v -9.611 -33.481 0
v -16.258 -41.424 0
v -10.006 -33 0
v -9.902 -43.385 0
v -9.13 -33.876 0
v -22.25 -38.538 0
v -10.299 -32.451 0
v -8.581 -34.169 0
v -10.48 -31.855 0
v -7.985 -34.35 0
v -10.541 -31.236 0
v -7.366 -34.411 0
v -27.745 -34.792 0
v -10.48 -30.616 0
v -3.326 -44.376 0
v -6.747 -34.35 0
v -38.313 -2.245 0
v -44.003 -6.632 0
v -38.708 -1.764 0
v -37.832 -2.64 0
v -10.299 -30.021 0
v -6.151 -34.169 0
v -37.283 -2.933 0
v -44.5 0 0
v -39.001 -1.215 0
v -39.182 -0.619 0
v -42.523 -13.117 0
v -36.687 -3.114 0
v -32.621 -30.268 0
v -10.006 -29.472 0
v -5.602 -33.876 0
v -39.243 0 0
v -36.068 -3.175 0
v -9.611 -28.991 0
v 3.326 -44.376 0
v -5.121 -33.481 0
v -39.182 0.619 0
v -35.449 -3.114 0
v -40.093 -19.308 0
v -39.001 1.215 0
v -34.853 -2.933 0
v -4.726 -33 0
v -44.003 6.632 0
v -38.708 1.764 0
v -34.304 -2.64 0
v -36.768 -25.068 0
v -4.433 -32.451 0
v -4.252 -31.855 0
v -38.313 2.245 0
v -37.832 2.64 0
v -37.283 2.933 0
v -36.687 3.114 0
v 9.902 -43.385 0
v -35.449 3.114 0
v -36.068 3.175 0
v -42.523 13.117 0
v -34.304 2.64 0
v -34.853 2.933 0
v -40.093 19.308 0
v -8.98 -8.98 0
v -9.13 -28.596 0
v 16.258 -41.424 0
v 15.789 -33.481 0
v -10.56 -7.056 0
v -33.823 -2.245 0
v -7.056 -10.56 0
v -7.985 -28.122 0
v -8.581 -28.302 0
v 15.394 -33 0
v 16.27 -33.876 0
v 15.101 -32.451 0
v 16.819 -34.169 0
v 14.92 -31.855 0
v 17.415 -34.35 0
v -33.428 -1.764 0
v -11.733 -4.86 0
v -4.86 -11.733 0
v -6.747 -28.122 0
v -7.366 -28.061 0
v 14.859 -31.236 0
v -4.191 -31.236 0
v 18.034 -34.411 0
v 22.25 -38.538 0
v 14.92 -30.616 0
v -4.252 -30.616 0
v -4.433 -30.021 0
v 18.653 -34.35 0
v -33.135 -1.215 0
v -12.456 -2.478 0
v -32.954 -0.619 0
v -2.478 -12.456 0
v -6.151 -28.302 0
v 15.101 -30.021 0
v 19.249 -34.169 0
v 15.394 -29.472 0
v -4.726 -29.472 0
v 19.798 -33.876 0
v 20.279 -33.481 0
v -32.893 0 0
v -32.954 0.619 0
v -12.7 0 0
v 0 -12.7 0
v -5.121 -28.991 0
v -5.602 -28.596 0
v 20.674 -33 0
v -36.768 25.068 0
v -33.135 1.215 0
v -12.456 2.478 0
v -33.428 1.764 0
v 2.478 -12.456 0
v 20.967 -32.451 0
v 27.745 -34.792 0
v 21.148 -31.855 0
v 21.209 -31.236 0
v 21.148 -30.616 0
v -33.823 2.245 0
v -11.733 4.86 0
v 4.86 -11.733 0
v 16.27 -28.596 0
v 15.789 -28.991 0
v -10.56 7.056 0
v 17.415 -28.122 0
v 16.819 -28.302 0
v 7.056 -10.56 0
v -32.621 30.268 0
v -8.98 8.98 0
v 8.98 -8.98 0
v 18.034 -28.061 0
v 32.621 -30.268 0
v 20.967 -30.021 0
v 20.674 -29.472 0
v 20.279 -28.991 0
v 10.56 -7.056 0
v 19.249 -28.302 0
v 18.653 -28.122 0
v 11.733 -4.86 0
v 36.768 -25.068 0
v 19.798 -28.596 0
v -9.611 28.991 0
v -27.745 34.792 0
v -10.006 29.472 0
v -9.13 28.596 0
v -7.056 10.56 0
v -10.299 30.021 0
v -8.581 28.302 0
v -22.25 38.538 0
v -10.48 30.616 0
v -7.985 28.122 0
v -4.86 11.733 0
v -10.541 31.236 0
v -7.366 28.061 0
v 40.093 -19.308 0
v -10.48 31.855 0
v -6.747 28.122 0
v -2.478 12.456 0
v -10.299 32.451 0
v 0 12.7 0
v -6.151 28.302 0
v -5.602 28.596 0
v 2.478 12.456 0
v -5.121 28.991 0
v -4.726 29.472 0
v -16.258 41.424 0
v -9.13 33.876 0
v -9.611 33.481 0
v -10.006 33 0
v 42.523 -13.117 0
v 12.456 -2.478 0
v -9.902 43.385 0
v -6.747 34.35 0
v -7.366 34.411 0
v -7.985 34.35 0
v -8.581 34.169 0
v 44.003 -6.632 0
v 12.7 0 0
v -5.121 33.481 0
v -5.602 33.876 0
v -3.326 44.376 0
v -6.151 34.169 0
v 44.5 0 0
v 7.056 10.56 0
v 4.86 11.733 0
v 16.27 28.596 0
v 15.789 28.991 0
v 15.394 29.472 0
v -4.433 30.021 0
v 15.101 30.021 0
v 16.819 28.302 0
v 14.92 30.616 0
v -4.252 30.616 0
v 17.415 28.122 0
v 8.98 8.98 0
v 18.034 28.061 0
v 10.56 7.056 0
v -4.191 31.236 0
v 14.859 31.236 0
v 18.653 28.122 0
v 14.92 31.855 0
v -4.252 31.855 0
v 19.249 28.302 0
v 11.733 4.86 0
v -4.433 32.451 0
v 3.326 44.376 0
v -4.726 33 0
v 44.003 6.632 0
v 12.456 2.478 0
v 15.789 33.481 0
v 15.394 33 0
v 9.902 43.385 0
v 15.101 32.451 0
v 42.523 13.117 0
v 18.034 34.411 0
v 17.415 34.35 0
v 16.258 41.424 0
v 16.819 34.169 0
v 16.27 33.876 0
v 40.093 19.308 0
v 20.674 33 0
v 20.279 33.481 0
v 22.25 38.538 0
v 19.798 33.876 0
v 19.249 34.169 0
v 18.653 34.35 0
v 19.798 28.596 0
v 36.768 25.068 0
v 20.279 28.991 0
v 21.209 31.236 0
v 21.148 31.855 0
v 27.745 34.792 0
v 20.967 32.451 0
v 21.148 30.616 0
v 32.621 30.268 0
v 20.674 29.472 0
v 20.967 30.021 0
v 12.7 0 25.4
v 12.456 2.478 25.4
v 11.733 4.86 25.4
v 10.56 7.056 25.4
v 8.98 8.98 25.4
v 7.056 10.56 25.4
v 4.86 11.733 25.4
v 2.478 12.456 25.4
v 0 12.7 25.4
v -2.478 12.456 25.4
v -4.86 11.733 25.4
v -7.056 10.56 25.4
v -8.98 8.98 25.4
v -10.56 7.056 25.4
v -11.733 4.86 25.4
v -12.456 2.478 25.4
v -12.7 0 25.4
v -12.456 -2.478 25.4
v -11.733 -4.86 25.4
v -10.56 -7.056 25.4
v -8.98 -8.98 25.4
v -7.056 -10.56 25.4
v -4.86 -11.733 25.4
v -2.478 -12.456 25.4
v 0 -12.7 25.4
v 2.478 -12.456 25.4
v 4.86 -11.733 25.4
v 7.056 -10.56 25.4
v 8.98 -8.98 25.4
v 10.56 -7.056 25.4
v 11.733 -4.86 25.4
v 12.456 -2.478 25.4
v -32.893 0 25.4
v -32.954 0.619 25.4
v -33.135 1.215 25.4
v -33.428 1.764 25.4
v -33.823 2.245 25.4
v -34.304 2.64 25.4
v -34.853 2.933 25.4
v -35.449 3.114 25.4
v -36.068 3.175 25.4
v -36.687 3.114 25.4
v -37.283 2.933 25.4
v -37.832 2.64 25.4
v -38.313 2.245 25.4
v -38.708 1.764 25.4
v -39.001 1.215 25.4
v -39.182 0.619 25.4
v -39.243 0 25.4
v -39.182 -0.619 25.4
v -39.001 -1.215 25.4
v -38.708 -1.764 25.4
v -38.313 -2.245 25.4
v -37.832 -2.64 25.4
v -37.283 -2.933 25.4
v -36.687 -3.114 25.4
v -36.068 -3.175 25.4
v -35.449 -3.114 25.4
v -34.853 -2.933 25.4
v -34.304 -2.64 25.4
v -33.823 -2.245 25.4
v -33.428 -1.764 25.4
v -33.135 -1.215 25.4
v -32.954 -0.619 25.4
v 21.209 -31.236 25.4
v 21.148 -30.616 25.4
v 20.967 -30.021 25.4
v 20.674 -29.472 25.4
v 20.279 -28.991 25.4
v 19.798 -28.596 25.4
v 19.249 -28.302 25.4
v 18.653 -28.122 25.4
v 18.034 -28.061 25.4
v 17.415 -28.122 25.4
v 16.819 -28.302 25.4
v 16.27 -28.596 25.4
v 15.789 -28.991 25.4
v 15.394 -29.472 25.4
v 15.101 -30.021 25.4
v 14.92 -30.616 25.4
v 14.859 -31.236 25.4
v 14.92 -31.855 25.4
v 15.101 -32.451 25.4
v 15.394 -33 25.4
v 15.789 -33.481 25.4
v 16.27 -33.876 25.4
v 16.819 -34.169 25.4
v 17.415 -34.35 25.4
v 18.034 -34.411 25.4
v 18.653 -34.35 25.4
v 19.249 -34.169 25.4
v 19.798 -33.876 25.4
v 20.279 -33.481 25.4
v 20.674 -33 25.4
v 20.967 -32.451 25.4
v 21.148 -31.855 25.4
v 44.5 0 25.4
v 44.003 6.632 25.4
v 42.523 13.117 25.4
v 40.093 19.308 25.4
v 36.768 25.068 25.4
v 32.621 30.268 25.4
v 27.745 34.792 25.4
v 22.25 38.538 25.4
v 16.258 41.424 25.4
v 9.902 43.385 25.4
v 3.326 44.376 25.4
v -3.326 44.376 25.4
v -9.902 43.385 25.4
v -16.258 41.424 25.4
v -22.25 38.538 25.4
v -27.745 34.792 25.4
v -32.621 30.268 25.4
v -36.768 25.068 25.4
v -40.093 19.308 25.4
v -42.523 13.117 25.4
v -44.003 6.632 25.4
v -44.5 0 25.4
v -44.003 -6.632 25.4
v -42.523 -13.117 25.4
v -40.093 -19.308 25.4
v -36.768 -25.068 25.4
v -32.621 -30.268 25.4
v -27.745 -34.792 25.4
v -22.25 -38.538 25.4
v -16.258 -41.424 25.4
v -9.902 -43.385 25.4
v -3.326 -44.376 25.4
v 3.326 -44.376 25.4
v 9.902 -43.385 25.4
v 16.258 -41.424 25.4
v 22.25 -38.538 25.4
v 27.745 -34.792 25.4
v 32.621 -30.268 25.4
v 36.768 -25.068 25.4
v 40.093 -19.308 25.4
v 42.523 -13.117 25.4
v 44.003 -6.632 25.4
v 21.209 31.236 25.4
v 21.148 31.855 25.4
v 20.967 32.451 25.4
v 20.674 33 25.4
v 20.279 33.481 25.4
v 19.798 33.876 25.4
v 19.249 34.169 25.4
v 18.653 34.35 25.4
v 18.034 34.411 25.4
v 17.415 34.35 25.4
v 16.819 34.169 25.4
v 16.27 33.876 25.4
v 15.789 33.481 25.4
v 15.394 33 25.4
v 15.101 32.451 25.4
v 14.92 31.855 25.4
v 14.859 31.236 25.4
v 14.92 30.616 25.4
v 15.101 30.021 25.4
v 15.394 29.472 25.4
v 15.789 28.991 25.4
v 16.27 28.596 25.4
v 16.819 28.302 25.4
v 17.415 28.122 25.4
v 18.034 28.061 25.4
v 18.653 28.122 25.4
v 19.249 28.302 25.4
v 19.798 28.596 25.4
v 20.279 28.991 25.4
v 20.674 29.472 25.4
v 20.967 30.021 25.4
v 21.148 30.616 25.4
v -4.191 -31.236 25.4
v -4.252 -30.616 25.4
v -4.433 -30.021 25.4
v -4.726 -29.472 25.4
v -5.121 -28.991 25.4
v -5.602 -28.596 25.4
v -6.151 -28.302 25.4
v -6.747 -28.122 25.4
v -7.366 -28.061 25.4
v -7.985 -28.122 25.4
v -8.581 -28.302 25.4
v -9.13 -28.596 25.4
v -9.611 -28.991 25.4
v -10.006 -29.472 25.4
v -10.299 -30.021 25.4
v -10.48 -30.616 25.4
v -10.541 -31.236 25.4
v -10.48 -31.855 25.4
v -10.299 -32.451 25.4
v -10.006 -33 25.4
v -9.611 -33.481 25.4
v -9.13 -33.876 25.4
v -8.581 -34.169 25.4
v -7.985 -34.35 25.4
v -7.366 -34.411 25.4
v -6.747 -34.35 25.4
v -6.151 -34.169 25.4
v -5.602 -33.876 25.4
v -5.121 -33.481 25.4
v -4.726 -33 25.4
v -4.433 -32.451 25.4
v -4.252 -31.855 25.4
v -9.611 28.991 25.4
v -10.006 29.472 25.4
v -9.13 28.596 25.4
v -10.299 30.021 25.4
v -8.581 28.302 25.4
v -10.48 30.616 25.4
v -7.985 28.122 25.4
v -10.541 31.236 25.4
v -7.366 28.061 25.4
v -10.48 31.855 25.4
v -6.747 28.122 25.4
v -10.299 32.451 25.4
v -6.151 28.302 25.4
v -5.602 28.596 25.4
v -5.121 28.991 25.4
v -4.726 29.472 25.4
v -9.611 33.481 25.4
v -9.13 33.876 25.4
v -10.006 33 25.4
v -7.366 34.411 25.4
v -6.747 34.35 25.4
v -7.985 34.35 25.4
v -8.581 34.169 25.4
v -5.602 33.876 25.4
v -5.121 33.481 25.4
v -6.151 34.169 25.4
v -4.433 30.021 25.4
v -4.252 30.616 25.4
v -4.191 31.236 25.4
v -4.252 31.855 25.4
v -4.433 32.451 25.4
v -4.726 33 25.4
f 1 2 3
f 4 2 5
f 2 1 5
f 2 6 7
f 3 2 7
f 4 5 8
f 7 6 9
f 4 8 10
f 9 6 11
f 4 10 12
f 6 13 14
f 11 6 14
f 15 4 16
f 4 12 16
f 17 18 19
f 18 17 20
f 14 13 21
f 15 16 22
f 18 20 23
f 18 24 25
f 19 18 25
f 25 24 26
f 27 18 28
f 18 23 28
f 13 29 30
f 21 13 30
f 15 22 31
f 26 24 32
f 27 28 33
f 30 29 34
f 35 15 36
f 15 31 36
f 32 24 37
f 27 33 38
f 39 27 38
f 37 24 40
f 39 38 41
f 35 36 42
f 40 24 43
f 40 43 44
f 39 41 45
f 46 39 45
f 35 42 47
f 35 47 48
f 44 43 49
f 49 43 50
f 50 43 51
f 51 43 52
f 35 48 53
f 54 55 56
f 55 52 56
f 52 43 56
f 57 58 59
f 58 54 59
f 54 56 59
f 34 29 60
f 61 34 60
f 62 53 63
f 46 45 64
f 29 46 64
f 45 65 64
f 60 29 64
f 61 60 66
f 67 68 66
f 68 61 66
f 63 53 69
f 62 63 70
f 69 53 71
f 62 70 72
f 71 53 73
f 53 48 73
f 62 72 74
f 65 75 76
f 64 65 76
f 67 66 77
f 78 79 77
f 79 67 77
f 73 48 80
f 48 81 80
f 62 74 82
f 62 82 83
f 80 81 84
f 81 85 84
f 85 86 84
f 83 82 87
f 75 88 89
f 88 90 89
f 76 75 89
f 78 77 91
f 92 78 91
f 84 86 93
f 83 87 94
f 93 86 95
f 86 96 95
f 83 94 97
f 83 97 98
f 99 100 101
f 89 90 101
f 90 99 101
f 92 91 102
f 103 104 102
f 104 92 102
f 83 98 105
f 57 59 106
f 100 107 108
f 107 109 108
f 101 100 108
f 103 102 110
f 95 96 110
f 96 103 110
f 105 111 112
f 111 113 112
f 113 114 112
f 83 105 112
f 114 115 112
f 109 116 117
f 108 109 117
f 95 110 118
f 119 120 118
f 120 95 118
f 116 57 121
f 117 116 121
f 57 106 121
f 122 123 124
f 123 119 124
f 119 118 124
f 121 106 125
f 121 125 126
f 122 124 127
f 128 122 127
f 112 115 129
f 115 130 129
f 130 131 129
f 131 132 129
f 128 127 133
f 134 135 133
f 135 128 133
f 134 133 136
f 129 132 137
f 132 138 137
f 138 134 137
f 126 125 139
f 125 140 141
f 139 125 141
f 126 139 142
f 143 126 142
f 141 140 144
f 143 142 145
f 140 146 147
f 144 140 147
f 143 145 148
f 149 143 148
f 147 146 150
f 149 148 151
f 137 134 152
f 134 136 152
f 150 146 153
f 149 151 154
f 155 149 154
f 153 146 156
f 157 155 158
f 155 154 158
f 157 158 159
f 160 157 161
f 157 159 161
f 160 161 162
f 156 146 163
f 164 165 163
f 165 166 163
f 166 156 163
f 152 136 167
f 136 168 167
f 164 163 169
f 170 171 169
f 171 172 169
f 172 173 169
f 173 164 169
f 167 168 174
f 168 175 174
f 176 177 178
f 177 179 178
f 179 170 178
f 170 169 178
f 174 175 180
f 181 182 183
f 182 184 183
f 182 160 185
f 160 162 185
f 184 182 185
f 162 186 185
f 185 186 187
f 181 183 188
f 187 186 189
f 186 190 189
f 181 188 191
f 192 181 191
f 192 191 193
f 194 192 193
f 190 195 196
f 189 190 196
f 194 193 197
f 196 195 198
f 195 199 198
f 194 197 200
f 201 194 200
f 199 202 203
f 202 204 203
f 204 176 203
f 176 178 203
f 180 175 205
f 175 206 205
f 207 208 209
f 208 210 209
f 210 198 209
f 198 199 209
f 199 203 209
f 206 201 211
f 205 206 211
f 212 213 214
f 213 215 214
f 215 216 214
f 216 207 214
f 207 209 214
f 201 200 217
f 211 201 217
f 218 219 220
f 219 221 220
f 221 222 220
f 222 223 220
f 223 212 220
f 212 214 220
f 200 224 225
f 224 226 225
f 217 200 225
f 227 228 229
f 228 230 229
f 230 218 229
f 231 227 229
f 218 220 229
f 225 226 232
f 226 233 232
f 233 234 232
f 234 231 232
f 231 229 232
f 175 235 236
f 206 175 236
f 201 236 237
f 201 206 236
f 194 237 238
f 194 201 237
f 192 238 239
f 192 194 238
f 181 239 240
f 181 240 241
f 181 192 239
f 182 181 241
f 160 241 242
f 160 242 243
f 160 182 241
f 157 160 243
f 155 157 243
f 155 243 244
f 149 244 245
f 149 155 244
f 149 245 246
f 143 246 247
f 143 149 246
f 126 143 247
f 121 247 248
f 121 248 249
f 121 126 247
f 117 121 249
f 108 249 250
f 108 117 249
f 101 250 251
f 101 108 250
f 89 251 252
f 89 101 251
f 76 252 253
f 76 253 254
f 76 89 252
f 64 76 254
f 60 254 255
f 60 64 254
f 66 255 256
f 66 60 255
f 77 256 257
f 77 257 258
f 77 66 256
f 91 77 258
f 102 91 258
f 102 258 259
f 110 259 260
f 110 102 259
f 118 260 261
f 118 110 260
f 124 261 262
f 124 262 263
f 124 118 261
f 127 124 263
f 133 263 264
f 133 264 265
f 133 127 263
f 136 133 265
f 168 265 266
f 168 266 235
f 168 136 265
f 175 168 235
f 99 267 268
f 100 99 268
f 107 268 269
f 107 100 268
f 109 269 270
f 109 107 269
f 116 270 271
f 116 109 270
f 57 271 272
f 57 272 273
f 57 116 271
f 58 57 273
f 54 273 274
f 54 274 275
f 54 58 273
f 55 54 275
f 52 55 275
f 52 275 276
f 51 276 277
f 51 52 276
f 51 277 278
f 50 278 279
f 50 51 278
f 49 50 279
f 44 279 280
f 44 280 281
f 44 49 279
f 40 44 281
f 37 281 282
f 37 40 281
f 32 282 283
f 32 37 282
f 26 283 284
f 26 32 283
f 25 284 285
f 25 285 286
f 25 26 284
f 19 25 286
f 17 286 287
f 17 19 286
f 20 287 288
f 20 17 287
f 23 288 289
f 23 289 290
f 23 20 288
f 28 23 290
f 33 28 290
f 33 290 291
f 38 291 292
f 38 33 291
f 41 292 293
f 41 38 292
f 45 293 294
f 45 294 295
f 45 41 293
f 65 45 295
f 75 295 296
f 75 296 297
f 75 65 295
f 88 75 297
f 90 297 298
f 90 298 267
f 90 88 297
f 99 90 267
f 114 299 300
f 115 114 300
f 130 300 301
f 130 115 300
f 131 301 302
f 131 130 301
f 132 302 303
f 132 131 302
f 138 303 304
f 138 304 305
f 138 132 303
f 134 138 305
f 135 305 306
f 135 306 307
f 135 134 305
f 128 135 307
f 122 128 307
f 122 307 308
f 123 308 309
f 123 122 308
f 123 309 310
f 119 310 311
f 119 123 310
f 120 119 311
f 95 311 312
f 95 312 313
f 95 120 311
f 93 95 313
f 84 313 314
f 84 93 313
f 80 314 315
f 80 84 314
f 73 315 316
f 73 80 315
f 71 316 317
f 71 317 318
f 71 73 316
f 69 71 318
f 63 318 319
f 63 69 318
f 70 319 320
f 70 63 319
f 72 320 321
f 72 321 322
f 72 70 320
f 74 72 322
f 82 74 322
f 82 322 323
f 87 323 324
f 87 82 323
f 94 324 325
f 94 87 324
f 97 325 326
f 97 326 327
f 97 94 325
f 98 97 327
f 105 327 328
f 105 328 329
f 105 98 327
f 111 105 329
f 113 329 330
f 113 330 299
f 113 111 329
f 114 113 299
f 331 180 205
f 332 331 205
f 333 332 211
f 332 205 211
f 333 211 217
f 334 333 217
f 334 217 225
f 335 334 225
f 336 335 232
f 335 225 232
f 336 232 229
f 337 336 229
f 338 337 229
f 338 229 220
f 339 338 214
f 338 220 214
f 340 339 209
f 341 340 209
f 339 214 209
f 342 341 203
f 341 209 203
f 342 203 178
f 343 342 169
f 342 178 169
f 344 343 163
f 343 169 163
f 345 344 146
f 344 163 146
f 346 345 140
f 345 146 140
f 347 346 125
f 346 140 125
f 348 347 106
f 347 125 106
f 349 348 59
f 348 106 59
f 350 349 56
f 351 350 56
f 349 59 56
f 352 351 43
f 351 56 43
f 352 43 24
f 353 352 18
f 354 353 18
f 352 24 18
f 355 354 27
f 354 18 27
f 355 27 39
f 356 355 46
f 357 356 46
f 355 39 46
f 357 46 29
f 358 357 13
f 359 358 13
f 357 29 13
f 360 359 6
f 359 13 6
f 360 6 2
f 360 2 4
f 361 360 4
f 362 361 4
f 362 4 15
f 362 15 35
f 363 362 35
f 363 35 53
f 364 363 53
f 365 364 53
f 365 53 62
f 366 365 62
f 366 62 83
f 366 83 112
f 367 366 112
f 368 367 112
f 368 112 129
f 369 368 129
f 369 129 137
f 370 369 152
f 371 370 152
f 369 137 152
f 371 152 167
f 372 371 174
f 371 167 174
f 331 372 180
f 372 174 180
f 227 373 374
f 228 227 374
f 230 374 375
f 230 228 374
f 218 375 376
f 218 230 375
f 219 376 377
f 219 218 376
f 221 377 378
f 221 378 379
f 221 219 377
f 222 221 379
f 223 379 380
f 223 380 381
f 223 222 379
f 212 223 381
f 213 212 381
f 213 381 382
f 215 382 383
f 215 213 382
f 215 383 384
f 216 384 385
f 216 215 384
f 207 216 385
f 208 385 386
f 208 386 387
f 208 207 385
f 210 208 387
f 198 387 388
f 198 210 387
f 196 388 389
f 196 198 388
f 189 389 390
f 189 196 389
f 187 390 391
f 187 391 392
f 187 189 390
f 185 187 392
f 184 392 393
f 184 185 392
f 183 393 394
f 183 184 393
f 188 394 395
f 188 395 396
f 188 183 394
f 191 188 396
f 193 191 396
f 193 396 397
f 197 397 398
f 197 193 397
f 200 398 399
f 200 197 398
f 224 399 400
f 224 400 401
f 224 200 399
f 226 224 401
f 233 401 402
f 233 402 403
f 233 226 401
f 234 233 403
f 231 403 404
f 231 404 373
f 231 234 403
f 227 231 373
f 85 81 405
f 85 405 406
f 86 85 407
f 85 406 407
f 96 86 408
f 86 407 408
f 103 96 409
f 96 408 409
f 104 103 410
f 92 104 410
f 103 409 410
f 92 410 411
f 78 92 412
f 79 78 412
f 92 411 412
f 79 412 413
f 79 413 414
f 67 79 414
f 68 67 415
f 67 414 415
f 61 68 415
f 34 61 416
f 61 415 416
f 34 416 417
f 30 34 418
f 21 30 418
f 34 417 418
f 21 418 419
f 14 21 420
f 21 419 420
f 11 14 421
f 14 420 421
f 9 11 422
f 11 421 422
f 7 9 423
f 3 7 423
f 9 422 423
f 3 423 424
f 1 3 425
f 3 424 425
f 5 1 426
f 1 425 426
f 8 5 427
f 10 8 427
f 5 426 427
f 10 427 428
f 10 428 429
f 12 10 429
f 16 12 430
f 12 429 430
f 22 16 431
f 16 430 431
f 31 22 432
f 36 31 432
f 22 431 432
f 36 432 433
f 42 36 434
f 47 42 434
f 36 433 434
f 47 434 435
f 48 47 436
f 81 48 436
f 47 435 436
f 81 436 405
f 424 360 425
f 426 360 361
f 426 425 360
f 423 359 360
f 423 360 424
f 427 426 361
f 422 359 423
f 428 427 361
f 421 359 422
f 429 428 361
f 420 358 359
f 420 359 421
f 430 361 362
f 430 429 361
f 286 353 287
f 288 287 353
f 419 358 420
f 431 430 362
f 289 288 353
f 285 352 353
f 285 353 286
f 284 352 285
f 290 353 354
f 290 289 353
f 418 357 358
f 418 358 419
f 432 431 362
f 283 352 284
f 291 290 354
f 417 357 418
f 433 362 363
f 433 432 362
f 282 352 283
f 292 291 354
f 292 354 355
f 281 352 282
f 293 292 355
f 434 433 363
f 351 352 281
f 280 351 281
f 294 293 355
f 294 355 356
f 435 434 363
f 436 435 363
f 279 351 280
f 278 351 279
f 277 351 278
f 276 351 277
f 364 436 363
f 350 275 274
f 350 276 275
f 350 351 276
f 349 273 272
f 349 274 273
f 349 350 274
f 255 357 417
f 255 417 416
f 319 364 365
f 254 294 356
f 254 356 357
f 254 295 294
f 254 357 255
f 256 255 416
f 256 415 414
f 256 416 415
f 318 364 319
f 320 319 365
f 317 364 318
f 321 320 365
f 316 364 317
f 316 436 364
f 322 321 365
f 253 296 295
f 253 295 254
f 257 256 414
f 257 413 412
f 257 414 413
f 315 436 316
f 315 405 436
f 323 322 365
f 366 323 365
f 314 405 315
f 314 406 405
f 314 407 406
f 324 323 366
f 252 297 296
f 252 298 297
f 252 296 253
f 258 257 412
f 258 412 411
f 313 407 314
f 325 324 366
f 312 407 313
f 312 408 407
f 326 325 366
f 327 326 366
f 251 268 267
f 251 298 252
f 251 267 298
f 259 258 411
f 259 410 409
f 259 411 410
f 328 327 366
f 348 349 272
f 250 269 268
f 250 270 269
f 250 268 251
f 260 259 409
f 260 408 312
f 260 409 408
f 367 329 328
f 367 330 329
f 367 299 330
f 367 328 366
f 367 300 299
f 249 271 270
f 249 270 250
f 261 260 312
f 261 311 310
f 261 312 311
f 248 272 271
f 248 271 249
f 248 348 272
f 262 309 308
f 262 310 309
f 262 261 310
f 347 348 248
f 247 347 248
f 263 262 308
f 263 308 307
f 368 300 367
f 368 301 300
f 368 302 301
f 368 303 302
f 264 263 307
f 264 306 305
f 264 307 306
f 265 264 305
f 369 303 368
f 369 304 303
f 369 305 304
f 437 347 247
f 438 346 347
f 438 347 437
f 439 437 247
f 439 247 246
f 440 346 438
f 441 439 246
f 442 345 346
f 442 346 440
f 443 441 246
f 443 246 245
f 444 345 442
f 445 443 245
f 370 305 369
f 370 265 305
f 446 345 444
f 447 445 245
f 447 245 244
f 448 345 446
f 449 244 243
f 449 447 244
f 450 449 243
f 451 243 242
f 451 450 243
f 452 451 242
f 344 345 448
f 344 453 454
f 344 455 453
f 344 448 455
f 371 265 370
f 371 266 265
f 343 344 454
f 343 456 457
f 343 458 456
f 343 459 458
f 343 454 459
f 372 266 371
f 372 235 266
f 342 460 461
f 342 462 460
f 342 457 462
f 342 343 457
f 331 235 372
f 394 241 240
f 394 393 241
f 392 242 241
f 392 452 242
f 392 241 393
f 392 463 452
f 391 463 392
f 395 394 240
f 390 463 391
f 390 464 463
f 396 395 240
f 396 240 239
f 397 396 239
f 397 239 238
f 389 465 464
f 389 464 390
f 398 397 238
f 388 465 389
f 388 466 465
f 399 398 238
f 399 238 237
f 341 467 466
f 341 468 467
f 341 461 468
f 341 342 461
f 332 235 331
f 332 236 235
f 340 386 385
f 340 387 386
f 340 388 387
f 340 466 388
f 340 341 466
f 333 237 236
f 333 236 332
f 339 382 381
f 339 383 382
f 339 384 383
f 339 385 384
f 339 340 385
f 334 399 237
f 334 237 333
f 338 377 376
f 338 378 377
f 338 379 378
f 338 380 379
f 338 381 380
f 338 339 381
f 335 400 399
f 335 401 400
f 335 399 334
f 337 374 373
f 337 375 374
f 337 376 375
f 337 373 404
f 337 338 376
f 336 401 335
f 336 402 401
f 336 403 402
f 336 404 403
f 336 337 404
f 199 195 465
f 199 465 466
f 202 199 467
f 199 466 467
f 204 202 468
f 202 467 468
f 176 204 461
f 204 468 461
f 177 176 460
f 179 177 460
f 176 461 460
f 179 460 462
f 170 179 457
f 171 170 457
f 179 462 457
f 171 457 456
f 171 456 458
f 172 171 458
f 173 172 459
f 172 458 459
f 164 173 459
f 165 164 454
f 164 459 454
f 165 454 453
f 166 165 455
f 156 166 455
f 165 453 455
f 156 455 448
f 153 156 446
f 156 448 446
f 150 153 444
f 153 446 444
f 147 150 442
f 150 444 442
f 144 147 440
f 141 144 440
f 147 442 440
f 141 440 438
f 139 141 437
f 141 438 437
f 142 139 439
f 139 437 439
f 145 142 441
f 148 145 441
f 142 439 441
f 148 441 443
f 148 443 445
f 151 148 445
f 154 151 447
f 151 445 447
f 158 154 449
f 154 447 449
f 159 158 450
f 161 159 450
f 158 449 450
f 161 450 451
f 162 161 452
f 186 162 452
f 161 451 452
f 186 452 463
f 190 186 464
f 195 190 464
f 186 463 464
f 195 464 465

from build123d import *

# Parameters (mm, degrees)
SKETCH1_R           = 44.500262214
SKETCH1_R_2         = 12.7
SKETCH1_R_3         = 3.175
BOSS_EXTRUDE1_DEPTH = 25.4
SKETCH2_R           = 3.175
CUT_EXTRUDE1_DEPTH  = 25.4


with BuildPart() as part:
    # Sketch1 → Boss-Extrude1 (new body)
    with BuildSketch(Plane.XY):
        Circle(SKETCH1_R)
        Circle(SKETCH1_R_2, mode=Mode.SUBTRACT)
        with Locations((-36.068, 0)):
            Circle(SKETCH1_R_3, mode=Mode.SUBTRACT)
        with Locations((18.034, 31.235804264)):
            Circle(SKETCH1_R_3, mode=Mode.SUBTRACT)
        with Locations((18.034, -31.235804264)):
            Circle(SKETCH1_R_3, mode=Mode.SUBTRACT)
    extrude(amount=BOSS_EXTRUDE1_DEPTH)

    # Sketch2 → Cut-Extrude1 (cut)
    with BuildSketch(Plane.XY.offset(25.4)):
        with Locations((-7.366, -31.235804264)):
            Circle(SKETCH2_R)
        with Locations((-7.366, 31.235804264)):
            Circle(SKETCH2_R)
    extrude(amount=-CUT_EXTRUDE1_DEPTH, mode=Mode.SUBTRACT)


solid = part.part
